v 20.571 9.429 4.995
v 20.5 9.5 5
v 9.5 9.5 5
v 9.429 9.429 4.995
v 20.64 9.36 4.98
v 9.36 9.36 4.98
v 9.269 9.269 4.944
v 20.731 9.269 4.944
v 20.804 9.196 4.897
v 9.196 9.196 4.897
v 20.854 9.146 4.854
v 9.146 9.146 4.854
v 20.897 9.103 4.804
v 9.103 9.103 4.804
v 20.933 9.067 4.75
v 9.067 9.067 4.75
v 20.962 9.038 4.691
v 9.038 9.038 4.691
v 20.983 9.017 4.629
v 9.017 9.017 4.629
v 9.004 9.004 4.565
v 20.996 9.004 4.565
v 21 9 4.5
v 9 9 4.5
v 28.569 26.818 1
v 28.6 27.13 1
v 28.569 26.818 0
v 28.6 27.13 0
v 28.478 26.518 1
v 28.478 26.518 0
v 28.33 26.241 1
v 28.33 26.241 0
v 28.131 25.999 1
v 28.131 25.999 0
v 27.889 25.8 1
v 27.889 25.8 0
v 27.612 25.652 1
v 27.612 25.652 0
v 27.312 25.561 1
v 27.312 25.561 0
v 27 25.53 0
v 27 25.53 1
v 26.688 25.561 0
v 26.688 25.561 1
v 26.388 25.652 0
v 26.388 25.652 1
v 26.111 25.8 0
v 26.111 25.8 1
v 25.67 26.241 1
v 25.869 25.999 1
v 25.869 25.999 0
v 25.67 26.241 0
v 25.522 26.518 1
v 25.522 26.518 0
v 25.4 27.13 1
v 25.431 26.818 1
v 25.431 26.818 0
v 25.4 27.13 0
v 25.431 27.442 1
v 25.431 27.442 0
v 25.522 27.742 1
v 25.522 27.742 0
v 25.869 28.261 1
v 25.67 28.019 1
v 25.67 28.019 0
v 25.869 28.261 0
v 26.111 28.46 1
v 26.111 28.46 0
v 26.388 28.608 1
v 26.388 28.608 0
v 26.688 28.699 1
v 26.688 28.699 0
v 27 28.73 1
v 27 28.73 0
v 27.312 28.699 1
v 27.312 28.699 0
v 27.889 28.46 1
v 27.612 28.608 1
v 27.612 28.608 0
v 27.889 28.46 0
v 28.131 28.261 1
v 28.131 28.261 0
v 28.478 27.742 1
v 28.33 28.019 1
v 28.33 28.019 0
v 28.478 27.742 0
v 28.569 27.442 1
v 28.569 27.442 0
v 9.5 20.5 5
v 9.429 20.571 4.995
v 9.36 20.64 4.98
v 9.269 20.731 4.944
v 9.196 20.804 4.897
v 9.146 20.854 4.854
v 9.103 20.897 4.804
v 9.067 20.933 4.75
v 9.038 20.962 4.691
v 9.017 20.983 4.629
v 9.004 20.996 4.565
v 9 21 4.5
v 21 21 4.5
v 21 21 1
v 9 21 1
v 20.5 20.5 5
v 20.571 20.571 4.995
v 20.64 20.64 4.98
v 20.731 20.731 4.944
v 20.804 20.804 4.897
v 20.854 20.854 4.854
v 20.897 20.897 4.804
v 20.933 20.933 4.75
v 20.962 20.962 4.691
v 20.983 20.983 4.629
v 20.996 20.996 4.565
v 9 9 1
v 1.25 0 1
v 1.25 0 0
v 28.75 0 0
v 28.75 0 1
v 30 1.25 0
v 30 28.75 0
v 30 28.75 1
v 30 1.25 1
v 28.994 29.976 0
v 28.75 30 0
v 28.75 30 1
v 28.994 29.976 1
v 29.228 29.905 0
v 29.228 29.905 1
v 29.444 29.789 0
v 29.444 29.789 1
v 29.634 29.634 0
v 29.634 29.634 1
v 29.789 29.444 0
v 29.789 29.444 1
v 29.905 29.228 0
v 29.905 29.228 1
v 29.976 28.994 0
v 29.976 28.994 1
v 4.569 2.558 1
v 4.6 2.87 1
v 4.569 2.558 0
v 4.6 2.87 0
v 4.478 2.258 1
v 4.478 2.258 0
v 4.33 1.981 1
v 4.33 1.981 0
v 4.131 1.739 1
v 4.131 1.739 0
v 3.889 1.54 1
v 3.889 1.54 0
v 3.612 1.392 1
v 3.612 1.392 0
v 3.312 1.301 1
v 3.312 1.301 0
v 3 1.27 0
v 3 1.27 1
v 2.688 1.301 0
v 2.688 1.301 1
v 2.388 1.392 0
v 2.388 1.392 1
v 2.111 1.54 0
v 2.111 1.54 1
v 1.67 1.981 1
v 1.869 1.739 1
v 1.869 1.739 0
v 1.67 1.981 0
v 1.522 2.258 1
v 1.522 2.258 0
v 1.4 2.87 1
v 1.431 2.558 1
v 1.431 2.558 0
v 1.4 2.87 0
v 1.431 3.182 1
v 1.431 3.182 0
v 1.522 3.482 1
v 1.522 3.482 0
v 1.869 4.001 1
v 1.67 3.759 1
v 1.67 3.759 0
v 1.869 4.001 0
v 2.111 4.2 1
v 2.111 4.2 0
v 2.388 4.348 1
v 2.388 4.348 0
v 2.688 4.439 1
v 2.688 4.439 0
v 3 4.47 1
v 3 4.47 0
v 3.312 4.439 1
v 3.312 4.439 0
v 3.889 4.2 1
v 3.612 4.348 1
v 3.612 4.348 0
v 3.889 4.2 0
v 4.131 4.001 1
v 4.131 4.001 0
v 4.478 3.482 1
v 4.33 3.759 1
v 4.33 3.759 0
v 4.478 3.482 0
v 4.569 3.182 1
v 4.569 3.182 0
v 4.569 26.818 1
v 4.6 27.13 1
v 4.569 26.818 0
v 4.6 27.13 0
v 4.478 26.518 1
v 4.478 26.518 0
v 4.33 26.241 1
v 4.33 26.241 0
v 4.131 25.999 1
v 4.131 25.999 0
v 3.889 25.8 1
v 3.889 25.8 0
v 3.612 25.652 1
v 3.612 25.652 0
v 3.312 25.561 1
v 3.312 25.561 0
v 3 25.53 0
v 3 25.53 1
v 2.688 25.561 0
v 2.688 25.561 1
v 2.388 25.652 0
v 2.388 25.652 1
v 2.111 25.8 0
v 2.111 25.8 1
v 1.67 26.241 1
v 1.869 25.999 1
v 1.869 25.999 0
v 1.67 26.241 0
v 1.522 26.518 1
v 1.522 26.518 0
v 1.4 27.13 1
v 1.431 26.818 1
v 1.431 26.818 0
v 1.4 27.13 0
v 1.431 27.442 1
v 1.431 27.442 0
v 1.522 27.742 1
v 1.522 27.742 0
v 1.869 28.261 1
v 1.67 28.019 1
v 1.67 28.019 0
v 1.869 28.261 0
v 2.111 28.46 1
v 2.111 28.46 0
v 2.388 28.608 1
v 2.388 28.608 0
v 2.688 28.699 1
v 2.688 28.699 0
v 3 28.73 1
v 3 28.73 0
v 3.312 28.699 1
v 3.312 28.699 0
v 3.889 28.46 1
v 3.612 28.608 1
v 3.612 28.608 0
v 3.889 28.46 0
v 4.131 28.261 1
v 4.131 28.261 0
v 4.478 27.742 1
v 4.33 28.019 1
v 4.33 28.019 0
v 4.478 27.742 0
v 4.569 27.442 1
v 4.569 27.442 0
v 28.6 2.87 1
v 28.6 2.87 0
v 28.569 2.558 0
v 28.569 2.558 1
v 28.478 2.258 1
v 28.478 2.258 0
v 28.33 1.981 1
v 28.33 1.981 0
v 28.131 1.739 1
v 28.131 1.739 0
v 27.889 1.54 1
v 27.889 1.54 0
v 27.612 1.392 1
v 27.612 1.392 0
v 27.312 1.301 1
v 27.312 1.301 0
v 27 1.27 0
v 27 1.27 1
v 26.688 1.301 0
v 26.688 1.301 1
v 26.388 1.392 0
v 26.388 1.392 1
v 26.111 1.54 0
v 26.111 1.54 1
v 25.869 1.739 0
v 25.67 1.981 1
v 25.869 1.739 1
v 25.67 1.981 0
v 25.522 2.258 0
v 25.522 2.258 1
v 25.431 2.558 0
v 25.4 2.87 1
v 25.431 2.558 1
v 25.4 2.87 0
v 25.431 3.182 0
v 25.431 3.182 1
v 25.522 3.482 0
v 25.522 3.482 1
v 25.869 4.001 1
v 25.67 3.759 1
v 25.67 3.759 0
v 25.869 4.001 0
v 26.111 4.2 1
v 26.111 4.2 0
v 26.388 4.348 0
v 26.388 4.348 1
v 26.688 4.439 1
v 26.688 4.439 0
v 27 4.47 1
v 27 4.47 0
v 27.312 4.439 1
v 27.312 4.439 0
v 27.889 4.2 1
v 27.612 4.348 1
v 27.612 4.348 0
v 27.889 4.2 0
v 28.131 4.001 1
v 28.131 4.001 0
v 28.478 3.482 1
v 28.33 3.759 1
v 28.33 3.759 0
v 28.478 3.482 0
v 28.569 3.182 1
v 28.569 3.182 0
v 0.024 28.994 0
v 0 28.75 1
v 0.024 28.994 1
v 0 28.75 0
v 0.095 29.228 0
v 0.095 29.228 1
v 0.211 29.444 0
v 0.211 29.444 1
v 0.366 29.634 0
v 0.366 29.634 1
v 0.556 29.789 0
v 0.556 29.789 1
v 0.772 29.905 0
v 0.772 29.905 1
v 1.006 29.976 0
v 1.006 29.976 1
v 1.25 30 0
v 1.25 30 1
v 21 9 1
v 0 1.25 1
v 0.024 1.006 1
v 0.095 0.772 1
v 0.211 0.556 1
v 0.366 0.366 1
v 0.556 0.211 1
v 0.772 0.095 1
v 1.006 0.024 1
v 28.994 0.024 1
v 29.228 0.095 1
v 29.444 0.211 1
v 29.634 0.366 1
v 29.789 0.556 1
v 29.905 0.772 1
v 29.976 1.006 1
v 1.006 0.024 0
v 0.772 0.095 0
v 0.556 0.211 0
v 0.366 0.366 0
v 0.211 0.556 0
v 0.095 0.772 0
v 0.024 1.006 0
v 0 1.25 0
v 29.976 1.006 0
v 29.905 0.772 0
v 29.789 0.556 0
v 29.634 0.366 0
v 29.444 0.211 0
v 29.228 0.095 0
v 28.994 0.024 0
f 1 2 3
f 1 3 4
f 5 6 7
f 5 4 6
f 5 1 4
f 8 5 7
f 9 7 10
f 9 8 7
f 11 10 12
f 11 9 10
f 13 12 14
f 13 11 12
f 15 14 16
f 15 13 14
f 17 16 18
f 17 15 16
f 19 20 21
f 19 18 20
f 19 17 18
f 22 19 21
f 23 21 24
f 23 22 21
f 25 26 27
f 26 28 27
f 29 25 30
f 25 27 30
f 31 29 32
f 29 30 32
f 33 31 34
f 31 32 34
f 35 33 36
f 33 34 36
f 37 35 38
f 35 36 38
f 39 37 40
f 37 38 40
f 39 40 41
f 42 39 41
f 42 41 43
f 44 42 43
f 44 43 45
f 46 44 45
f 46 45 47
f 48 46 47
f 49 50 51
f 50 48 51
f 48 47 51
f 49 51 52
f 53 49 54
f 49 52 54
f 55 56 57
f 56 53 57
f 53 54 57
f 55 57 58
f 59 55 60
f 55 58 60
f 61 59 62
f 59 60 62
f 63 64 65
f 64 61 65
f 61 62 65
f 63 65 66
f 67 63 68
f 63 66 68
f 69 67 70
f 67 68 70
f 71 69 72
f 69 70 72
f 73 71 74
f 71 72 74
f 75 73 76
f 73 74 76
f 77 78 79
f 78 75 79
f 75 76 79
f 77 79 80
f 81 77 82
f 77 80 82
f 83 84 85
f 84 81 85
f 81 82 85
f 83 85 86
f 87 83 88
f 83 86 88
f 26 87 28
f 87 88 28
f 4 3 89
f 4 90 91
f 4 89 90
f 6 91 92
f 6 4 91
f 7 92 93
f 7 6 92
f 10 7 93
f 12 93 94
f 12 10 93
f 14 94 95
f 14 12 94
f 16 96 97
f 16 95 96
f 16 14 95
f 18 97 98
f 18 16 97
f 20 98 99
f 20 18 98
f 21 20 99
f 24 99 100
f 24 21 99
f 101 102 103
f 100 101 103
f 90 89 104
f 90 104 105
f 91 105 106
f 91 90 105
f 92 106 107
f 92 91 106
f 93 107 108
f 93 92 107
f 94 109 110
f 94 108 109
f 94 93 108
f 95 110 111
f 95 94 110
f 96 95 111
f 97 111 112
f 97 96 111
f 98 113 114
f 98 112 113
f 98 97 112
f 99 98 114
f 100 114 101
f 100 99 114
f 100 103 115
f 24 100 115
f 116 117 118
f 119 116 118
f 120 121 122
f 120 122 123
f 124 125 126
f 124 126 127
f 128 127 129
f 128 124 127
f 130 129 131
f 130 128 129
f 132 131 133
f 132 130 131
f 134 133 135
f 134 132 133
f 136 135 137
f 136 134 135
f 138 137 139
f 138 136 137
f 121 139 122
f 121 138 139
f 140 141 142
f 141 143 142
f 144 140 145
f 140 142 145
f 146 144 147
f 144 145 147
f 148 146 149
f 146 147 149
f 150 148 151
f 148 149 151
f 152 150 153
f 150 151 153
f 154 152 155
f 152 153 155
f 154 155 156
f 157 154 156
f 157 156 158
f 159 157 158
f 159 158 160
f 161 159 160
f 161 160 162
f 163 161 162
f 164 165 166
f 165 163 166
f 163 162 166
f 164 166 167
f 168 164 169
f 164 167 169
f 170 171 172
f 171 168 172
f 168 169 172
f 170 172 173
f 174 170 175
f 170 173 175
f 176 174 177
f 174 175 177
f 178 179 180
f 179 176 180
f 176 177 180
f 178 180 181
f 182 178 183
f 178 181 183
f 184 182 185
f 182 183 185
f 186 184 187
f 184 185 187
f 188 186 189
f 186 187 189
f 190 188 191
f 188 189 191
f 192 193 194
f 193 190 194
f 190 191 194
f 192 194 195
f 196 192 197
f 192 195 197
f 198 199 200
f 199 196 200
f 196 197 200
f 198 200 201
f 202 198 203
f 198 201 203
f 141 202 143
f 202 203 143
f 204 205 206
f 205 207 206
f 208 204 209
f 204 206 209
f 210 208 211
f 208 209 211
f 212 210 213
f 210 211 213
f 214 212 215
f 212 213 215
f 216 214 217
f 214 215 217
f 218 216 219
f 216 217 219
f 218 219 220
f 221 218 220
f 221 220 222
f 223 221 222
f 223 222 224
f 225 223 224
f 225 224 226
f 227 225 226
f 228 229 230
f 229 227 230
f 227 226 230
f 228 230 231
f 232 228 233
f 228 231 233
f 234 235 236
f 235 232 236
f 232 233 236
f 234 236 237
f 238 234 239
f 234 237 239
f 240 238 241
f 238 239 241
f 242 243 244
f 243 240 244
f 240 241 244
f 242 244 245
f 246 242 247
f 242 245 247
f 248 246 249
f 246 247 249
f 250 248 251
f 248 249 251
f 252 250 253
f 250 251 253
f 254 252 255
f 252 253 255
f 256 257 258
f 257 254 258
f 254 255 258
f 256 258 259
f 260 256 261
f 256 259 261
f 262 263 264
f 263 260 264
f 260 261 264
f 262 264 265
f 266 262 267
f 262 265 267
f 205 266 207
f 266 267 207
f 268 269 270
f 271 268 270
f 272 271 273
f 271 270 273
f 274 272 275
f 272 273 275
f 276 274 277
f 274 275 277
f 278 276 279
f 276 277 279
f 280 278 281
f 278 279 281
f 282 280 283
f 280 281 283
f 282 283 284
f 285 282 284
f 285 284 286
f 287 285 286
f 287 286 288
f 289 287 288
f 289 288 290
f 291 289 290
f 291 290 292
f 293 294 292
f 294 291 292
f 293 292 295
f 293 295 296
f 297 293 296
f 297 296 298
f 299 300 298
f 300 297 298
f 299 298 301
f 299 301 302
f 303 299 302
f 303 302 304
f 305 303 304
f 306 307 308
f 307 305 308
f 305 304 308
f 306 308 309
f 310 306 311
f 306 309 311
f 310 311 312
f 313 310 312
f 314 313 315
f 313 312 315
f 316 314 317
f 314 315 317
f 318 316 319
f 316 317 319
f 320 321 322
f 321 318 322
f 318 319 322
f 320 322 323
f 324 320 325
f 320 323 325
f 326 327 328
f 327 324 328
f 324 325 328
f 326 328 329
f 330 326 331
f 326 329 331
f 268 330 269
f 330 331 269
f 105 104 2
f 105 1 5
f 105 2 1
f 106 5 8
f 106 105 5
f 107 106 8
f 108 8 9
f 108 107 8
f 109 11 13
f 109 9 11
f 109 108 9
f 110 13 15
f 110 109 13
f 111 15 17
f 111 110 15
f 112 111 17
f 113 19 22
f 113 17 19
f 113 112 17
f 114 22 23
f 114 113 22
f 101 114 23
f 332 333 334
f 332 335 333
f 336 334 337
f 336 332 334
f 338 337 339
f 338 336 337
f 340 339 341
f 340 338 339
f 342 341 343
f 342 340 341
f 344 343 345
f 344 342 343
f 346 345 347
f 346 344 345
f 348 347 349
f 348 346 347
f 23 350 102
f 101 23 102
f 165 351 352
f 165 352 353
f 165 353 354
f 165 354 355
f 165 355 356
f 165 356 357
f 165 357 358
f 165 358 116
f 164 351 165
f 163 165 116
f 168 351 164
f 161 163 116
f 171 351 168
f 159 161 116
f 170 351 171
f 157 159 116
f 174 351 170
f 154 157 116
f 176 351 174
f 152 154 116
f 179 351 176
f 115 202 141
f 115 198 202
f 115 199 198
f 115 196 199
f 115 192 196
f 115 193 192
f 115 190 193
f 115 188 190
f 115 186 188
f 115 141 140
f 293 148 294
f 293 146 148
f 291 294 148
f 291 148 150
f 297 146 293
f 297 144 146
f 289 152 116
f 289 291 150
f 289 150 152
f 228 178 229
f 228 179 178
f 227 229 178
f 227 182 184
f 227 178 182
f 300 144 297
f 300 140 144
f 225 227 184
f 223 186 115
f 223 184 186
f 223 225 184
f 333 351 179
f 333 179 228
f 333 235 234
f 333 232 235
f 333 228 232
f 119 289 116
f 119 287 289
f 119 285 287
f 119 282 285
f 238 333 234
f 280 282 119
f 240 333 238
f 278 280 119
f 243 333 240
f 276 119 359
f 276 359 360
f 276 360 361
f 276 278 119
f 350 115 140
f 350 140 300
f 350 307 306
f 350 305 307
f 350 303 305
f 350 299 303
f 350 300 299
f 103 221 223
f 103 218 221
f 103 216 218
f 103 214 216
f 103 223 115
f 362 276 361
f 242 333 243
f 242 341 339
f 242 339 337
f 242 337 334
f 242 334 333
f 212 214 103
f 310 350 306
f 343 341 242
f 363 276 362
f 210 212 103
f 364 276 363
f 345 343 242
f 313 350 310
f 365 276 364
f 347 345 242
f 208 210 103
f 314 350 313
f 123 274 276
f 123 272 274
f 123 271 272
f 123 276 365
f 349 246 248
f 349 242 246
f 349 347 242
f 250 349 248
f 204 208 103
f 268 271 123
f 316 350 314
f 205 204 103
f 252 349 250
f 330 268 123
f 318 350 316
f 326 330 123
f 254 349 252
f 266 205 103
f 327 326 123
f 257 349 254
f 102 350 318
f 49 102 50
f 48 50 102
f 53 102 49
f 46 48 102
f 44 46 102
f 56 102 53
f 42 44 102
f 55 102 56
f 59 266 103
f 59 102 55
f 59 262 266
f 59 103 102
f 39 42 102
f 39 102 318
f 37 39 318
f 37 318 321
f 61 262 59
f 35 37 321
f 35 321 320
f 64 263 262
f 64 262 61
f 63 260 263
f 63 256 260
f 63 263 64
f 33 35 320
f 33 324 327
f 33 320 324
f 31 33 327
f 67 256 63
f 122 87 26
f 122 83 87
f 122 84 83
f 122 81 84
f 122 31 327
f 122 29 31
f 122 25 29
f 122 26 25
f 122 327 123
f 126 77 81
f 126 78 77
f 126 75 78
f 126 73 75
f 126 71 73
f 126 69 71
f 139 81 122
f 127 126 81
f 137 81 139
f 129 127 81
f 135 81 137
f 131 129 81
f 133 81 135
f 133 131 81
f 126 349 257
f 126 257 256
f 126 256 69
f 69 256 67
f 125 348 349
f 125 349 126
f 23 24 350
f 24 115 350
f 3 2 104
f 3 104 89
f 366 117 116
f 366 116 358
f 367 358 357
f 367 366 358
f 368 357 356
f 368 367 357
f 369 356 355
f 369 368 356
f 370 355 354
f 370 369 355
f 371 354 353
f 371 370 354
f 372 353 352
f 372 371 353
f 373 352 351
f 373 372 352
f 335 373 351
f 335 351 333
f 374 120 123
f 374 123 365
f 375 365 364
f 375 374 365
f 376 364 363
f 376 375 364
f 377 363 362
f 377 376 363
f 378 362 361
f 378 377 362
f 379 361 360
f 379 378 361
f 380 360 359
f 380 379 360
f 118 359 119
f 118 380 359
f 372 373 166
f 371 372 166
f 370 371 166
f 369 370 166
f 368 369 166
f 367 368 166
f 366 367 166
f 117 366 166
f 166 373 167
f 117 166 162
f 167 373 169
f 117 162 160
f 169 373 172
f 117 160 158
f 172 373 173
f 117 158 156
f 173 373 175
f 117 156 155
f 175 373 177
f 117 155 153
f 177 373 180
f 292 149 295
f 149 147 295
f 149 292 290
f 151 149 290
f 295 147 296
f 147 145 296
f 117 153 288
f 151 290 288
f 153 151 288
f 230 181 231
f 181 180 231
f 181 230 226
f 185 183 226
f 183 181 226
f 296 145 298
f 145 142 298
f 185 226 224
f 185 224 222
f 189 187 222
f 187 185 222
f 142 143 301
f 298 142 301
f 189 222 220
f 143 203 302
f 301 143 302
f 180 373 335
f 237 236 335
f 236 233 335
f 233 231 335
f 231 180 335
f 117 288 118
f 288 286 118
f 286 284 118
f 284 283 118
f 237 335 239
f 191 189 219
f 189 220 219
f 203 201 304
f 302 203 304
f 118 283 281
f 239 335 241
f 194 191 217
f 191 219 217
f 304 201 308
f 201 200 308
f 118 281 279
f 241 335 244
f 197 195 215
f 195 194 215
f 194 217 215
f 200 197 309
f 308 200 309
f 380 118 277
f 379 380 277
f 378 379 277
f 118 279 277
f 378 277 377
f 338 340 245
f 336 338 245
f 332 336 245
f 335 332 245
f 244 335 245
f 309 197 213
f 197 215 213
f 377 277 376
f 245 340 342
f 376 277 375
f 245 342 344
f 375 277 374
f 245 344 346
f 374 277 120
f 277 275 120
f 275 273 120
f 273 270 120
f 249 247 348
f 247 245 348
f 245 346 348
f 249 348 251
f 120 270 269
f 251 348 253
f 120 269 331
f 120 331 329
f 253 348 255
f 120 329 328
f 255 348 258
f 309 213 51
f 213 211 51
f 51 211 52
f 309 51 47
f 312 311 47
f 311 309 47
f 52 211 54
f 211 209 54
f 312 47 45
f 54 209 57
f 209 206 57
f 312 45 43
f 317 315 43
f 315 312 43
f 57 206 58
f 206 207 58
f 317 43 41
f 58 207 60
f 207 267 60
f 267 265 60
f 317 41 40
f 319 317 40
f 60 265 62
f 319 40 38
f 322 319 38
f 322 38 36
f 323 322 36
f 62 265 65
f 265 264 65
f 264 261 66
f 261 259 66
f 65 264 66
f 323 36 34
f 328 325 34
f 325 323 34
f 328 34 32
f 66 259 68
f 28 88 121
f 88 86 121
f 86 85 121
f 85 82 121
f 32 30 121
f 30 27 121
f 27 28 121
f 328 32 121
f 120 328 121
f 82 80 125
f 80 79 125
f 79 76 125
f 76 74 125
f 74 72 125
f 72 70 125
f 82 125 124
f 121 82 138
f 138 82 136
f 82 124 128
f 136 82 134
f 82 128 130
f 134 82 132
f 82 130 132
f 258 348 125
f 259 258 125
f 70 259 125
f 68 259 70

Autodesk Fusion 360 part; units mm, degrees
sketch "スケッチ1" plane through (0, 0, 0) normal (0, 0, 1) x (1, 0, 0)
  line L0 (0, 0) -> (30, 0)
  line L1 (30, 0) -> (0, 0)
  line L2 (0, 0) -> (0, 30)
  line L3 (0, 30) -> (30, 30)
  line L4 (30, 30) -> (30, 0)
  line L5 (0, 0) -> (1.25, 0)
  line L6 (0, 0) -> (0, 1.25)
  arc A0 (0, 1.25) -> (1.25, 0) centre (1.25, 1.25) ccw
  arc A1 (1.25, 30) -> (0, 28.75) centre (1.25, 28.75) ccw
  arc A2 (30, 28.75) -> (28.75, 30) centre (28.75, 28.75) ccw
  arc A3 (28.75, 0) -> (30, 1.25) centre (28.75, 1.25) ccw
  line L7 (0, 30) -> (0, 28.73)
  circle A4 centre (3, 27.13) radius 1.6
  circle A5 centre (27, 27.13) radius 1.6
  circle A6 centre (27, 2.87) radius 1.6
  circle A7 centre (3, 2.87) radius 1.6
  dimension "d1" = 30
  dimension "d2" = 1.25
  dimension "d3" = 1.25
  dimension "d4" = 1.27
  dimension "d6" = 3.2
extrude "押し出し1" add sketch "スケッチ1" along normal blind 1 contours L0 L1 L2 L3 L4 A0 A1 A2 A3 L7
sketch "スケッチ2" plane through (0, 0, 1) normal (0, 0, 1) x (-1, 0, 0)
  circle A0 centre (-3, -27.13) radius 1.6
  circle A1 centre (-3, -2.87) radius 1.6
  circle A2 centre (-27, -2.87) radius 1.6
  circle A3 centre (-27, -27.13) radius 1.6
  arc A4 (-30, -28.75) -> (-28.75, -30) centre (-28.75, -28.75) ccw
  line L0 (-28.75, -30) -> (-1.25, -30)
  arc A5 (-1.25, -30) -> (0, -28.75) centre (-1.25, -28.75) ccw
  line L1 (0, -28.75) -> (0, -1.25)
  arc A6 (0, -1.25) -> (-1.25, 0) centre (-1.25, -1.25) ccw
  line L2 (-1.25, 0) -> (-28.75, 0)
  arc A7 (-28.75, 0) -> (-30, -1.25) centre (-28.75, -1.25) ccw
  line L3 (-30, -1.25) -> (-30, -28.75)
  line L4 (-8, -22) -> (-8, -8)
  line L5 (-8, -8) -> (-22, -8)
  line L6 (-22, -8) -> (-22, -22)
  line L7 (-22, -22) -> (-8, -22)
sketch "スケッチ3" plane through (0, 0, 1) normal (0, 0, 1) x (-1, 0, 0)
  circle A0 centre (-3, -27.13) radius 1.6
  circle A1 centre (-3, -2.87) radius 1.6
  circle A2 centre (-27, -2.87) radius 1.6
  circle A3 centre (-27, -27.13) radius 1.6
  arc A4 (-30, -28.75) -> (-28.75, -30) centre (-28.75, -28.75) ccw
  line L0 (-28.75, -30) -> (-1.25, -30)
  arc A5 (-1.25, -30) -> (0, -28.75) centre (-1.25, -28.75) ccw
  line L1 (0, -28.75) -> (0, -1.25)
  arc A6 (0, -1.25) -> (-1.25, 0) centre (-1.25, -1.25) ccw
  line L2 (-1.25, 0) -> (-28.75, 0)
  arc A7 (-28.75, 0) -> (-30, -1.25) centre (-28.75, -1.25) ccw
  line L3 (-30, -1.25) -> (-30, -28.75)
  line L4 (-9, -21) -> (-9, -9)
  line L5 (-9, -9) -> (-21, -9)
  line L6 (-21, -9) -> (-21, -21)
  line L7 (-21, -21) -> (-9, -21)
extrude "押し出し3" add sketch "スケッチ3" along normal blind 4 contours L4 L5 L6 L7
fillet "フィレット2" radius 0.5 1 faces at (13, 17, 5)
extrude "押し出し2" [suppressed]
fillet "フィレット1" [suppressed]
